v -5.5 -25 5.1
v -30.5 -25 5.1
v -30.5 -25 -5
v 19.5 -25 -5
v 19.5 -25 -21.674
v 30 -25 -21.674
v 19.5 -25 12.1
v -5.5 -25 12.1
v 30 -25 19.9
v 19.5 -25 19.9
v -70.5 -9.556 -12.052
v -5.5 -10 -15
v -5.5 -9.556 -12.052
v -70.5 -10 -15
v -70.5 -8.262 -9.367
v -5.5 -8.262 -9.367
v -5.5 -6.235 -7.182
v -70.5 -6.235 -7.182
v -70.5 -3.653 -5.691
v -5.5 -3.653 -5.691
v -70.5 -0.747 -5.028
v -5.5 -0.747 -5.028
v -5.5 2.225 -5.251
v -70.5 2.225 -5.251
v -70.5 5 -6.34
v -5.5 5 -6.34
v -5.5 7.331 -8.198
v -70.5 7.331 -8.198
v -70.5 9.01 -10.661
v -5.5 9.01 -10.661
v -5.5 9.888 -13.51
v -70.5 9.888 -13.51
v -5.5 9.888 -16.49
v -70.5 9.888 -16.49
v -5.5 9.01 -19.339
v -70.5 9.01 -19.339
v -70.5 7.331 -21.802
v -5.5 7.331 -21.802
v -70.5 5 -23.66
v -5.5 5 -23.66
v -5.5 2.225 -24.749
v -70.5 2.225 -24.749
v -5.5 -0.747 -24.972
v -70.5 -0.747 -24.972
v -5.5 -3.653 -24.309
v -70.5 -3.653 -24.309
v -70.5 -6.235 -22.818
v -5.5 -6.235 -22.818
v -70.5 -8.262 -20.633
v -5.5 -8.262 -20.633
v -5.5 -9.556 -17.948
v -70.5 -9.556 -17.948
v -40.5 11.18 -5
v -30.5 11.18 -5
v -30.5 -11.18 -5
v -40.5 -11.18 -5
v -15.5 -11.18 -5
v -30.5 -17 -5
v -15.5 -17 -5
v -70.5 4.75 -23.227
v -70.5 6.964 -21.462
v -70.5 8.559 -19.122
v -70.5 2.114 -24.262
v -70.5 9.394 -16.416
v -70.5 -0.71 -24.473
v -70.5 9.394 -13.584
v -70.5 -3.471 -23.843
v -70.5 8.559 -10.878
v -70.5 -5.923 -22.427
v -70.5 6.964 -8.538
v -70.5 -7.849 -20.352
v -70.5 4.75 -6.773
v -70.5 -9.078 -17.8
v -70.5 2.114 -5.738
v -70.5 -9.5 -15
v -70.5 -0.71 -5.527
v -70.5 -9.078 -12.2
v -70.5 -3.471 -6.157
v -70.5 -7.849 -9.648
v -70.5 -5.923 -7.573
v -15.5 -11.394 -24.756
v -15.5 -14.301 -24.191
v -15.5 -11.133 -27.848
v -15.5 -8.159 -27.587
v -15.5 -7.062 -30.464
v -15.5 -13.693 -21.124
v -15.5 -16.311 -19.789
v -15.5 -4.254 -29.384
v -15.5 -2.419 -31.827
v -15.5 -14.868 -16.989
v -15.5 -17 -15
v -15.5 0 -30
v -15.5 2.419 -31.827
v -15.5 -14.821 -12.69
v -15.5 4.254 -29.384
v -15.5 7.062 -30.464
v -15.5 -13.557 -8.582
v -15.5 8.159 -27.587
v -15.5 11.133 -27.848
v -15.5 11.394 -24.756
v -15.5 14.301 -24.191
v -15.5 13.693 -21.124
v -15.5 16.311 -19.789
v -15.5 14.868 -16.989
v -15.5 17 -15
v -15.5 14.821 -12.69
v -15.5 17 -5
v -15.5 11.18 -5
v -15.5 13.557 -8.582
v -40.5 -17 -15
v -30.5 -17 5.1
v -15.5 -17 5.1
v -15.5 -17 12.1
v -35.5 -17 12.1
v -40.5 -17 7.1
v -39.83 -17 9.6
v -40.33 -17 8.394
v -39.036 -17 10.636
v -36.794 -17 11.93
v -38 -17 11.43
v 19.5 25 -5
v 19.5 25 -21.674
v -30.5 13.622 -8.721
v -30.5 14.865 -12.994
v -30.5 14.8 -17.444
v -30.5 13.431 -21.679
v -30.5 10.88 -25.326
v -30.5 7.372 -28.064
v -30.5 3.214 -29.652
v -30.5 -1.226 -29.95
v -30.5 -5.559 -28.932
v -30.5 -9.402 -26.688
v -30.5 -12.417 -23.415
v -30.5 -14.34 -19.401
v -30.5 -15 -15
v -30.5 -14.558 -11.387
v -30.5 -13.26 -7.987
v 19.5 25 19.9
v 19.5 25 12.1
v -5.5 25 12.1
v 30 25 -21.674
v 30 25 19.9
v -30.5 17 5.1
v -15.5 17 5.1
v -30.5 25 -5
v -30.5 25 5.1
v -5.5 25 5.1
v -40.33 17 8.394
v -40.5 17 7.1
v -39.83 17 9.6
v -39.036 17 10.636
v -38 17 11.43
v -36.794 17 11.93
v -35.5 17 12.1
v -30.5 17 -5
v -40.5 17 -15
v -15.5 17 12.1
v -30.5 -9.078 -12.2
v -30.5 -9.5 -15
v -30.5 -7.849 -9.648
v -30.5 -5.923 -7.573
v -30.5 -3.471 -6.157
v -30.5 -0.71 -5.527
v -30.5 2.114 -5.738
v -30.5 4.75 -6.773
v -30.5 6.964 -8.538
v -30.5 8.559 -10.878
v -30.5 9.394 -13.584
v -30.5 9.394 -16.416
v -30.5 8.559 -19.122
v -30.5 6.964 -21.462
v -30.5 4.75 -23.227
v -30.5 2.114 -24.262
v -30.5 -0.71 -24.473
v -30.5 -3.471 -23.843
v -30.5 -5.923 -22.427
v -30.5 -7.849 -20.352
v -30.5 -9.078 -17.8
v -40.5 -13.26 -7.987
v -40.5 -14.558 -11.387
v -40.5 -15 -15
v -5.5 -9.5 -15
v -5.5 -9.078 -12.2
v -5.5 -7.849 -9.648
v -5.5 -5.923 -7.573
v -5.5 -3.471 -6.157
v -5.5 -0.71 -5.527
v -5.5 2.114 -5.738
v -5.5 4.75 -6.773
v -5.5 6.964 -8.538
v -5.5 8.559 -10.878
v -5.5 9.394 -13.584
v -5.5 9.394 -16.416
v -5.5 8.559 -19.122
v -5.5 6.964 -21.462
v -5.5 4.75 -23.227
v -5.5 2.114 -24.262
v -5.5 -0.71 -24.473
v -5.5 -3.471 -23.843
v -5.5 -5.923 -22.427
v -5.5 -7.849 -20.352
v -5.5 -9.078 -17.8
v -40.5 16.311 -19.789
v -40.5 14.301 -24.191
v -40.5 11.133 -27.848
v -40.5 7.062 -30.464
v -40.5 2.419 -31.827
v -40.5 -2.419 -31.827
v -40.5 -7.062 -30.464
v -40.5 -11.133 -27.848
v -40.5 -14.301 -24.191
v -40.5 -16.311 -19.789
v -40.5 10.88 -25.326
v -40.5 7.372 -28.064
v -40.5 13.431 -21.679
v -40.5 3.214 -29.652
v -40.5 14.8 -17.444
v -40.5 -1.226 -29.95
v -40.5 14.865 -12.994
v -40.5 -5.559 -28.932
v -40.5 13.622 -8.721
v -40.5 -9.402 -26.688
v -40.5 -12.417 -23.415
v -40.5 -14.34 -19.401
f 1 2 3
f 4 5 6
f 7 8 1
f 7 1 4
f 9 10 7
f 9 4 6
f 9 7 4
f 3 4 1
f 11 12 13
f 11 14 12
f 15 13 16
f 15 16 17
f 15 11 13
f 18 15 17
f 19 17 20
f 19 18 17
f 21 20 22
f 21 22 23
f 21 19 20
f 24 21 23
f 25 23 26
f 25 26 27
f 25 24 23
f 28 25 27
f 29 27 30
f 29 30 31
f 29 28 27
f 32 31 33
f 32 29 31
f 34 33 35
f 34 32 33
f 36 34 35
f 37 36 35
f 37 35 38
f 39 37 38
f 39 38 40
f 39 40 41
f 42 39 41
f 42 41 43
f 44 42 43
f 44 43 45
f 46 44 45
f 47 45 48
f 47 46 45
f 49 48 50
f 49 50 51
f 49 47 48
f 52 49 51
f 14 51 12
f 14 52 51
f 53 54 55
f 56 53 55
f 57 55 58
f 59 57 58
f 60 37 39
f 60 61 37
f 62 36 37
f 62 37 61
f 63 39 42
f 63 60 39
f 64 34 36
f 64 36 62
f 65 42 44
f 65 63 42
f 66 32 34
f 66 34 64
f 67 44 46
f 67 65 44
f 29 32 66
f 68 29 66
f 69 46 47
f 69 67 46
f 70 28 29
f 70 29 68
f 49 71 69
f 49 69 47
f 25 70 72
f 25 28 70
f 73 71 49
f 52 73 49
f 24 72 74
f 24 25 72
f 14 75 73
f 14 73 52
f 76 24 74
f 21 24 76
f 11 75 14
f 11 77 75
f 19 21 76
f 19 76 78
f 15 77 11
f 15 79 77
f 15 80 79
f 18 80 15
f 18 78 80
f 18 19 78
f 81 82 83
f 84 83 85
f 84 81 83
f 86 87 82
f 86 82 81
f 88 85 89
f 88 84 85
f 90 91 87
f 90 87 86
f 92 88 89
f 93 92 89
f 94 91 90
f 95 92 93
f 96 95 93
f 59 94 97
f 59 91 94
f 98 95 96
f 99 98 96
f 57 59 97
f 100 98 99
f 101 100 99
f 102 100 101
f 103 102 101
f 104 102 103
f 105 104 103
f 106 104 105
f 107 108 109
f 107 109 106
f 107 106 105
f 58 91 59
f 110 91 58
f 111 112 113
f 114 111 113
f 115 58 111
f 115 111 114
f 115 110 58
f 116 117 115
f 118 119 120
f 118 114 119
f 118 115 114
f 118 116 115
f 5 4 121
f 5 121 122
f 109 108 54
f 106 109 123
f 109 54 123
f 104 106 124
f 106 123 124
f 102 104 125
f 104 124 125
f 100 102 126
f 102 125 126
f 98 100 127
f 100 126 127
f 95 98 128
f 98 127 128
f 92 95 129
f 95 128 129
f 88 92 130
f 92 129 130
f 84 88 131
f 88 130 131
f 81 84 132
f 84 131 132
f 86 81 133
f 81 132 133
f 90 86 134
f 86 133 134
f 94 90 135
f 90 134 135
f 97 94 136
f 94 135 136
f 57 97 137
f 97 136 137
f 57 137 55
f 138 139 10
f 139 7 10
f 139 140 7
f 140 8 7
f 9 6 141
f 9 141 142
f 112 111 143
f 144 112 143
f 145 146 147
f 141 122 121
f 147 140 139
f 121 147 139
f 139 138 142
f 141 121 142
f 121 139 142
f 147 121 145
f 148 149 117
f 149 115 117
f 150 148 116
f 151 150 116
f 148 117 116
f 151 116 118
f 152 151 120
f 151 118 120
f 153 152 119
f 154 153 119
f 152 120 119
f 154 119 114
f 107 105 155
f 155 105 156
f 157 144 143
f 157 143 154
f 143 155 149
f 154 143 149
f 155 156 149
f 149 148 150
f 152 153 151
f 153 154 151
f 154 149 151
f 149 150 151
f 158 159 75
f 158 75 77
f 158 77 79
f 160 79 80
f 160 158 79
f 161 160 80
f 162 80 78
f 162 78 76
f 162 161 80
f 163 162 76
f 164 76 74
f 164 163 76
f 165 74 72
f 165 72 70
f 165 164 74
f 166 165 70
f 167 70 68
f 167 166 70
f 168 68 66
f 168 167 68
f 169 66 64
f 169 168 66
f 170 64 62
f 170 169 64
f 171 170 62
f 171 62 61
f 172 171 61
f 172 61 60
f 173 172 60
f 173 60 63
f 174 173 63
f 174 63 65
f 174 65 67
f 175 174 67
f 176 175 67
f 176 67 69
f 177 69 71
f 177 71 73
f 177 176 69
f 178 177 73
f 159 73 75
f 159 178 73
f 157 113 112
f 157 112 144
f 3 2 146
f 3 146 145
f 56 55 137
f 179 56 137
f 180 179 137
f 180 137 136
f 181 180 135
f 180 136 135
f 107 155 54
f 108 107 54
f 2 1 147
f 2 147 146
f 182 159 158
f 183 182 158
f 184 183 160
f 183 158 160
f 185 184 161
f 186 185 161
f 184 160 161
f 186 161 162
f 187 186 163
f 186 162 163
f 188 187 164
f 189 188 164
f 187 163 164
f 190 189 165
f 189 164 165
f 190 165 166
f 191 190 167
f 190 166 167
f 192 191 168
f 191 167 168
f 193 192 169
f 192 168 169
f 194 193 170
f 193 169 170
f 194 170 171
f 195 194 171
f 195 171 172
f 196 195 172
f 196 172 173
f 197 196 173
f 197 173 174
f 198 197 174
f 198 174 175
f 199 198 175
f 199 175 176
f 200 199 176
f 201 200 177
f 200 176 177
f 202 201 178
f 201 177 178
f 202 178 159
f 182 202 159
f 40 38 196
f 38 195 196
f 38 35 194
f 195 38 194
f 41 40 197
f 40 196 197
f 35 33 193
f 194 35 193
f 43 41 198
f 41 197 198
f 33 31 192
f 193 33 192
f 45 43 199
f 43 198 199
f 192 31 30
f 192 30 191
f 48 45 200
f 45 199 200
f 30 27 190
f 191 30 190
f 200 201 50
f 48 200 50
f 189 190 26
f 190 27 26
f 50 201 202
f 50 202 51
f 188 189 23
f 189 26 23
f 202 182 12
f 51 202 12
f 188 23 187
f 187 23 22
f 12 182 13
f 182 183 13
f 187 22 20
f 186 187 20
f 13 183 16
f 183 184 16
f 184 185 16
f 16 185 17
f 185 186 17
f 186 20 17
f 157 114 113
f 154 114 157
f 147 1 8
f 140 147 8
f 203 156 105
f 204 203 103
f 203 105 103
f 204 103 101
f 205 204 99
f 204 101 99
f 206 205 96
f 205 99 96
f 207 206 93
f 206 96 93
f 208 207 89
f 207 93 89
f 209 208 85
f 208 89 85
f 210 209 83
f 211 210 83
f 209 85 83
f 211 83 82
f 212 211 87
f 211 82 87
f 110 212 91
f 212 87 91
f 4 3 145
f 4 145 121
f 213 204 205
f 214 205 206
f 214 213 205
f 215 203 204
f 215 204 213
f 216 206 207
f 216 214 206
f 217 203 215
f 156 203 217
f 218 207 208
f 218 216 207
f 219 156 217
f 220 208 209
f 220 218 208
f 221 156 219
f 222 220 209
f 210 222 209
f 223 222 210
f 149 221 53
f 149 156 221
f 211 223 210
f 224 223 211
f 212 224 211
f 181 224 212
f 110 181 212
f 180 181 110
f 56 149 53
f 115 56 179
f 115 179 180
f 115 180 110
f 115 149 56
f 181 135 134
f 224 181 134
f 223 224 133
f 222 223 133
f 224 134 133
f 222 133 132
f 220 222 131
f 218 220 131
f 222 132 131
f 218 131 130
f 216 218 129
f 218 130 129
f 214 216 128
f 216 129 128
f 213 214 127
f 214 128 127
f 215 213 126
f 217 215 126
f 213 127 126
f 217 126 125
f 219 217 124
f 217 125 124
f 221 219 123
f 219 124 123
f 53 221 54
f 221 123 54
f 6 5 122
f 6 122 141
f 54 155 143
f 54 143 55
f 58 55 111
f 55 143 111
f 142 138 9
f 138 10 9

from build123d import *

# Parameters (mm, degrees)
F0_W          = 25
F0_H          = 7
F0_W_2        = 10.5
F0_H_2        = 16.6735936701
F0_H_3        = 10.1
F0_H_4        = 7.8
F1_DEPTH      = 25
F1_DEPTH_BACK = 25
F2_R          = 10
F2_R_2        = 9.5
F3_DEPTH      = 40
F3_DEPTH_BACK = 25
F4_W          = 34
F4_H          = 7
F5_DEPTH      = 10
F6_W          = 34
F6_H          = 7
F7_DEPTH      = 15
F8_R          = 5


with BuildPart() as f1:
    # F0 (on Front) → F1 (new body, two sides)
    with BuildSketch(Plane.XZ) as f1_sk:
        with Locations((7, 8.6)):
            Rectangle(F0_W, F0_H)
        with Locations((24.75, -13.3367968351)):
            Rectangle(F0_W_2, F0_H_2)
        with Locations((24.75, 0.05)):
            Rectangle(F0_W_2, F0_H_3)
        with Locations((24.75, 16)):
            Rectangle(F0_W_2, F0_H_4)
        with Locations((24.75, 8.6)):
            Rectangle(F0_W_2, F0_H)
        Polygon((-5.5, 5.1), (-30.5, 5.1), (-30.5, -5), (19.5, -5), (19.5, 5.1), align=None)
    extrude(amount=F1_DEPTH)
    extrude(f1_sk.sketch, amount=-F1_DEPTH_BACK)


with BuildPart() as f3:
    # F2 (on face) → F3 (new body, two sides)
    with BuildSketch(Plane(origin=(-30.5, 0, 0), x_dir=(0, -1, 0), z_dir=(-1, 0, 0))) as f3_sk:
        with Locations((0, -15)):
            Circle(F2_R)
        with Locations((0, -15)):
            Circle(F2_R_2, mode=Mode.SUBTRACT)
    extrude(amount=F3_DEPTH)
    extrude(f3_sk.sketch, amount=-F3_DEPTH_BACK)


with BuildPart() as f5:
    # F4 (on face) → F5 (new body)
    with BuildSketch(Plane(origin=(-30.5, 0, 0), x_dir=(0, -1, 0), z_dir=(-1, 0, 0))):
        with BuildLine():
            ThreePointArc((11.1803398875, -5), (14.0125853844, -9.6476686534), (15, -15))
            ThreePointArc((15, -15), (-5.3523313466, -29.0125853844), (-11.1803398875, -5))
            Line((-11.1803398875, -5), (-13.7477270849, -5))
            ThreePointArc((-13.7477270849, -5), (-16.1664987001, -9.7422134145), (-17, -15))
            ThreePointArc((-17, -15), (0, -32), (17, -15))
            ThreePointArc((17, -15), (16.1664987001, -9.7422134145), (13.7477270849, -5))
            Line((13.7477270849, -5), (11.1803398875, -5))
        make_face()
        with BuildLine():
            ThreePointArc((-17, -15), (-16.1664987001, -9.7422134145), (-13.7477270849, -5))
            Line((-13.7477270849, -5), (-17, -5))
            Line((-17, -5), (-17, -15))
        make_face()
        with BuildLine():
            Line((17, -5), (13.7477270849, -5))
            ThreePointArc((13.7477270849, -5), (16.1664987001, -9.7422134145), (17, -15))
            Line((17, -15), (17, -5))
        make_face()
        with BuildLine():
            ThreePointArc((-13.7477270849, -5), (0, 2), (13.7477270849, -5))
            Line((13.7477270849, -5), (17, -5))
            Line((17, -5), (17, 5.1))
            Line((17, 5.1), (-17, 5.1))
            Line((-17, 5.1), (-17, -5))
            Line((-17, -5), (-13.7477270849, -5))
        make_face()
        with BuildLine():
            ThreePointArc((-11.1803398875, -5), (0, 0), (11.1803398875, -5))
            Line((11.1803398875, -5), (13.7477270849, -5))
            ThreePointArc((13.7477270849, -5), (0, 2), (-13.7477270849, -5))
            Line((-13.7477270849, -5), (-11.1803398875, -5))
        make_face()
        with BuildLine():
            Line((-11.1803398875, -5), (11.1803398875, -5))
            ThreePointArc((11.1803398875, -5), (0, 0), (-11.1803398875, -5))
        make_face()
        with Locations((0, 8.6)):
            Rectangle(F4_W, F4_H)
    extrude(amount=F5_DEPTH)

    # F6 (on face) → F7 (join)
    with BuildSketch(Plane.YZ.offset(-30.5)):
        with Locations((0, 8.6)):
            Rectangle(F6_W, F6_H)
        with BuildLine():
            Line((17, -15), (17, -5))
            Line((17, -5), (11.1803398875, -5))
            ThreePointArc((11.1803398875, -5), (0, -30), (-11.1803398875, -5))
            Line((-11.1803398875, -5), (-17, -5))
            Line((-17, -5), (-17, -15))
            ThreePointArc((-17, -15), (0, -32), (17, -15))
        make_face()
    extrude(amount=F7_DEPTH)

    # F8
    f8_edges = [f5.edges().sort_by_distance(p)[0] for p in [
        (-40.5, 0, 12.1),
    ]]
    fillet(f8_edges, radius=F8_R)


solid = Compound([f1.part, f3.part, f5.part])
